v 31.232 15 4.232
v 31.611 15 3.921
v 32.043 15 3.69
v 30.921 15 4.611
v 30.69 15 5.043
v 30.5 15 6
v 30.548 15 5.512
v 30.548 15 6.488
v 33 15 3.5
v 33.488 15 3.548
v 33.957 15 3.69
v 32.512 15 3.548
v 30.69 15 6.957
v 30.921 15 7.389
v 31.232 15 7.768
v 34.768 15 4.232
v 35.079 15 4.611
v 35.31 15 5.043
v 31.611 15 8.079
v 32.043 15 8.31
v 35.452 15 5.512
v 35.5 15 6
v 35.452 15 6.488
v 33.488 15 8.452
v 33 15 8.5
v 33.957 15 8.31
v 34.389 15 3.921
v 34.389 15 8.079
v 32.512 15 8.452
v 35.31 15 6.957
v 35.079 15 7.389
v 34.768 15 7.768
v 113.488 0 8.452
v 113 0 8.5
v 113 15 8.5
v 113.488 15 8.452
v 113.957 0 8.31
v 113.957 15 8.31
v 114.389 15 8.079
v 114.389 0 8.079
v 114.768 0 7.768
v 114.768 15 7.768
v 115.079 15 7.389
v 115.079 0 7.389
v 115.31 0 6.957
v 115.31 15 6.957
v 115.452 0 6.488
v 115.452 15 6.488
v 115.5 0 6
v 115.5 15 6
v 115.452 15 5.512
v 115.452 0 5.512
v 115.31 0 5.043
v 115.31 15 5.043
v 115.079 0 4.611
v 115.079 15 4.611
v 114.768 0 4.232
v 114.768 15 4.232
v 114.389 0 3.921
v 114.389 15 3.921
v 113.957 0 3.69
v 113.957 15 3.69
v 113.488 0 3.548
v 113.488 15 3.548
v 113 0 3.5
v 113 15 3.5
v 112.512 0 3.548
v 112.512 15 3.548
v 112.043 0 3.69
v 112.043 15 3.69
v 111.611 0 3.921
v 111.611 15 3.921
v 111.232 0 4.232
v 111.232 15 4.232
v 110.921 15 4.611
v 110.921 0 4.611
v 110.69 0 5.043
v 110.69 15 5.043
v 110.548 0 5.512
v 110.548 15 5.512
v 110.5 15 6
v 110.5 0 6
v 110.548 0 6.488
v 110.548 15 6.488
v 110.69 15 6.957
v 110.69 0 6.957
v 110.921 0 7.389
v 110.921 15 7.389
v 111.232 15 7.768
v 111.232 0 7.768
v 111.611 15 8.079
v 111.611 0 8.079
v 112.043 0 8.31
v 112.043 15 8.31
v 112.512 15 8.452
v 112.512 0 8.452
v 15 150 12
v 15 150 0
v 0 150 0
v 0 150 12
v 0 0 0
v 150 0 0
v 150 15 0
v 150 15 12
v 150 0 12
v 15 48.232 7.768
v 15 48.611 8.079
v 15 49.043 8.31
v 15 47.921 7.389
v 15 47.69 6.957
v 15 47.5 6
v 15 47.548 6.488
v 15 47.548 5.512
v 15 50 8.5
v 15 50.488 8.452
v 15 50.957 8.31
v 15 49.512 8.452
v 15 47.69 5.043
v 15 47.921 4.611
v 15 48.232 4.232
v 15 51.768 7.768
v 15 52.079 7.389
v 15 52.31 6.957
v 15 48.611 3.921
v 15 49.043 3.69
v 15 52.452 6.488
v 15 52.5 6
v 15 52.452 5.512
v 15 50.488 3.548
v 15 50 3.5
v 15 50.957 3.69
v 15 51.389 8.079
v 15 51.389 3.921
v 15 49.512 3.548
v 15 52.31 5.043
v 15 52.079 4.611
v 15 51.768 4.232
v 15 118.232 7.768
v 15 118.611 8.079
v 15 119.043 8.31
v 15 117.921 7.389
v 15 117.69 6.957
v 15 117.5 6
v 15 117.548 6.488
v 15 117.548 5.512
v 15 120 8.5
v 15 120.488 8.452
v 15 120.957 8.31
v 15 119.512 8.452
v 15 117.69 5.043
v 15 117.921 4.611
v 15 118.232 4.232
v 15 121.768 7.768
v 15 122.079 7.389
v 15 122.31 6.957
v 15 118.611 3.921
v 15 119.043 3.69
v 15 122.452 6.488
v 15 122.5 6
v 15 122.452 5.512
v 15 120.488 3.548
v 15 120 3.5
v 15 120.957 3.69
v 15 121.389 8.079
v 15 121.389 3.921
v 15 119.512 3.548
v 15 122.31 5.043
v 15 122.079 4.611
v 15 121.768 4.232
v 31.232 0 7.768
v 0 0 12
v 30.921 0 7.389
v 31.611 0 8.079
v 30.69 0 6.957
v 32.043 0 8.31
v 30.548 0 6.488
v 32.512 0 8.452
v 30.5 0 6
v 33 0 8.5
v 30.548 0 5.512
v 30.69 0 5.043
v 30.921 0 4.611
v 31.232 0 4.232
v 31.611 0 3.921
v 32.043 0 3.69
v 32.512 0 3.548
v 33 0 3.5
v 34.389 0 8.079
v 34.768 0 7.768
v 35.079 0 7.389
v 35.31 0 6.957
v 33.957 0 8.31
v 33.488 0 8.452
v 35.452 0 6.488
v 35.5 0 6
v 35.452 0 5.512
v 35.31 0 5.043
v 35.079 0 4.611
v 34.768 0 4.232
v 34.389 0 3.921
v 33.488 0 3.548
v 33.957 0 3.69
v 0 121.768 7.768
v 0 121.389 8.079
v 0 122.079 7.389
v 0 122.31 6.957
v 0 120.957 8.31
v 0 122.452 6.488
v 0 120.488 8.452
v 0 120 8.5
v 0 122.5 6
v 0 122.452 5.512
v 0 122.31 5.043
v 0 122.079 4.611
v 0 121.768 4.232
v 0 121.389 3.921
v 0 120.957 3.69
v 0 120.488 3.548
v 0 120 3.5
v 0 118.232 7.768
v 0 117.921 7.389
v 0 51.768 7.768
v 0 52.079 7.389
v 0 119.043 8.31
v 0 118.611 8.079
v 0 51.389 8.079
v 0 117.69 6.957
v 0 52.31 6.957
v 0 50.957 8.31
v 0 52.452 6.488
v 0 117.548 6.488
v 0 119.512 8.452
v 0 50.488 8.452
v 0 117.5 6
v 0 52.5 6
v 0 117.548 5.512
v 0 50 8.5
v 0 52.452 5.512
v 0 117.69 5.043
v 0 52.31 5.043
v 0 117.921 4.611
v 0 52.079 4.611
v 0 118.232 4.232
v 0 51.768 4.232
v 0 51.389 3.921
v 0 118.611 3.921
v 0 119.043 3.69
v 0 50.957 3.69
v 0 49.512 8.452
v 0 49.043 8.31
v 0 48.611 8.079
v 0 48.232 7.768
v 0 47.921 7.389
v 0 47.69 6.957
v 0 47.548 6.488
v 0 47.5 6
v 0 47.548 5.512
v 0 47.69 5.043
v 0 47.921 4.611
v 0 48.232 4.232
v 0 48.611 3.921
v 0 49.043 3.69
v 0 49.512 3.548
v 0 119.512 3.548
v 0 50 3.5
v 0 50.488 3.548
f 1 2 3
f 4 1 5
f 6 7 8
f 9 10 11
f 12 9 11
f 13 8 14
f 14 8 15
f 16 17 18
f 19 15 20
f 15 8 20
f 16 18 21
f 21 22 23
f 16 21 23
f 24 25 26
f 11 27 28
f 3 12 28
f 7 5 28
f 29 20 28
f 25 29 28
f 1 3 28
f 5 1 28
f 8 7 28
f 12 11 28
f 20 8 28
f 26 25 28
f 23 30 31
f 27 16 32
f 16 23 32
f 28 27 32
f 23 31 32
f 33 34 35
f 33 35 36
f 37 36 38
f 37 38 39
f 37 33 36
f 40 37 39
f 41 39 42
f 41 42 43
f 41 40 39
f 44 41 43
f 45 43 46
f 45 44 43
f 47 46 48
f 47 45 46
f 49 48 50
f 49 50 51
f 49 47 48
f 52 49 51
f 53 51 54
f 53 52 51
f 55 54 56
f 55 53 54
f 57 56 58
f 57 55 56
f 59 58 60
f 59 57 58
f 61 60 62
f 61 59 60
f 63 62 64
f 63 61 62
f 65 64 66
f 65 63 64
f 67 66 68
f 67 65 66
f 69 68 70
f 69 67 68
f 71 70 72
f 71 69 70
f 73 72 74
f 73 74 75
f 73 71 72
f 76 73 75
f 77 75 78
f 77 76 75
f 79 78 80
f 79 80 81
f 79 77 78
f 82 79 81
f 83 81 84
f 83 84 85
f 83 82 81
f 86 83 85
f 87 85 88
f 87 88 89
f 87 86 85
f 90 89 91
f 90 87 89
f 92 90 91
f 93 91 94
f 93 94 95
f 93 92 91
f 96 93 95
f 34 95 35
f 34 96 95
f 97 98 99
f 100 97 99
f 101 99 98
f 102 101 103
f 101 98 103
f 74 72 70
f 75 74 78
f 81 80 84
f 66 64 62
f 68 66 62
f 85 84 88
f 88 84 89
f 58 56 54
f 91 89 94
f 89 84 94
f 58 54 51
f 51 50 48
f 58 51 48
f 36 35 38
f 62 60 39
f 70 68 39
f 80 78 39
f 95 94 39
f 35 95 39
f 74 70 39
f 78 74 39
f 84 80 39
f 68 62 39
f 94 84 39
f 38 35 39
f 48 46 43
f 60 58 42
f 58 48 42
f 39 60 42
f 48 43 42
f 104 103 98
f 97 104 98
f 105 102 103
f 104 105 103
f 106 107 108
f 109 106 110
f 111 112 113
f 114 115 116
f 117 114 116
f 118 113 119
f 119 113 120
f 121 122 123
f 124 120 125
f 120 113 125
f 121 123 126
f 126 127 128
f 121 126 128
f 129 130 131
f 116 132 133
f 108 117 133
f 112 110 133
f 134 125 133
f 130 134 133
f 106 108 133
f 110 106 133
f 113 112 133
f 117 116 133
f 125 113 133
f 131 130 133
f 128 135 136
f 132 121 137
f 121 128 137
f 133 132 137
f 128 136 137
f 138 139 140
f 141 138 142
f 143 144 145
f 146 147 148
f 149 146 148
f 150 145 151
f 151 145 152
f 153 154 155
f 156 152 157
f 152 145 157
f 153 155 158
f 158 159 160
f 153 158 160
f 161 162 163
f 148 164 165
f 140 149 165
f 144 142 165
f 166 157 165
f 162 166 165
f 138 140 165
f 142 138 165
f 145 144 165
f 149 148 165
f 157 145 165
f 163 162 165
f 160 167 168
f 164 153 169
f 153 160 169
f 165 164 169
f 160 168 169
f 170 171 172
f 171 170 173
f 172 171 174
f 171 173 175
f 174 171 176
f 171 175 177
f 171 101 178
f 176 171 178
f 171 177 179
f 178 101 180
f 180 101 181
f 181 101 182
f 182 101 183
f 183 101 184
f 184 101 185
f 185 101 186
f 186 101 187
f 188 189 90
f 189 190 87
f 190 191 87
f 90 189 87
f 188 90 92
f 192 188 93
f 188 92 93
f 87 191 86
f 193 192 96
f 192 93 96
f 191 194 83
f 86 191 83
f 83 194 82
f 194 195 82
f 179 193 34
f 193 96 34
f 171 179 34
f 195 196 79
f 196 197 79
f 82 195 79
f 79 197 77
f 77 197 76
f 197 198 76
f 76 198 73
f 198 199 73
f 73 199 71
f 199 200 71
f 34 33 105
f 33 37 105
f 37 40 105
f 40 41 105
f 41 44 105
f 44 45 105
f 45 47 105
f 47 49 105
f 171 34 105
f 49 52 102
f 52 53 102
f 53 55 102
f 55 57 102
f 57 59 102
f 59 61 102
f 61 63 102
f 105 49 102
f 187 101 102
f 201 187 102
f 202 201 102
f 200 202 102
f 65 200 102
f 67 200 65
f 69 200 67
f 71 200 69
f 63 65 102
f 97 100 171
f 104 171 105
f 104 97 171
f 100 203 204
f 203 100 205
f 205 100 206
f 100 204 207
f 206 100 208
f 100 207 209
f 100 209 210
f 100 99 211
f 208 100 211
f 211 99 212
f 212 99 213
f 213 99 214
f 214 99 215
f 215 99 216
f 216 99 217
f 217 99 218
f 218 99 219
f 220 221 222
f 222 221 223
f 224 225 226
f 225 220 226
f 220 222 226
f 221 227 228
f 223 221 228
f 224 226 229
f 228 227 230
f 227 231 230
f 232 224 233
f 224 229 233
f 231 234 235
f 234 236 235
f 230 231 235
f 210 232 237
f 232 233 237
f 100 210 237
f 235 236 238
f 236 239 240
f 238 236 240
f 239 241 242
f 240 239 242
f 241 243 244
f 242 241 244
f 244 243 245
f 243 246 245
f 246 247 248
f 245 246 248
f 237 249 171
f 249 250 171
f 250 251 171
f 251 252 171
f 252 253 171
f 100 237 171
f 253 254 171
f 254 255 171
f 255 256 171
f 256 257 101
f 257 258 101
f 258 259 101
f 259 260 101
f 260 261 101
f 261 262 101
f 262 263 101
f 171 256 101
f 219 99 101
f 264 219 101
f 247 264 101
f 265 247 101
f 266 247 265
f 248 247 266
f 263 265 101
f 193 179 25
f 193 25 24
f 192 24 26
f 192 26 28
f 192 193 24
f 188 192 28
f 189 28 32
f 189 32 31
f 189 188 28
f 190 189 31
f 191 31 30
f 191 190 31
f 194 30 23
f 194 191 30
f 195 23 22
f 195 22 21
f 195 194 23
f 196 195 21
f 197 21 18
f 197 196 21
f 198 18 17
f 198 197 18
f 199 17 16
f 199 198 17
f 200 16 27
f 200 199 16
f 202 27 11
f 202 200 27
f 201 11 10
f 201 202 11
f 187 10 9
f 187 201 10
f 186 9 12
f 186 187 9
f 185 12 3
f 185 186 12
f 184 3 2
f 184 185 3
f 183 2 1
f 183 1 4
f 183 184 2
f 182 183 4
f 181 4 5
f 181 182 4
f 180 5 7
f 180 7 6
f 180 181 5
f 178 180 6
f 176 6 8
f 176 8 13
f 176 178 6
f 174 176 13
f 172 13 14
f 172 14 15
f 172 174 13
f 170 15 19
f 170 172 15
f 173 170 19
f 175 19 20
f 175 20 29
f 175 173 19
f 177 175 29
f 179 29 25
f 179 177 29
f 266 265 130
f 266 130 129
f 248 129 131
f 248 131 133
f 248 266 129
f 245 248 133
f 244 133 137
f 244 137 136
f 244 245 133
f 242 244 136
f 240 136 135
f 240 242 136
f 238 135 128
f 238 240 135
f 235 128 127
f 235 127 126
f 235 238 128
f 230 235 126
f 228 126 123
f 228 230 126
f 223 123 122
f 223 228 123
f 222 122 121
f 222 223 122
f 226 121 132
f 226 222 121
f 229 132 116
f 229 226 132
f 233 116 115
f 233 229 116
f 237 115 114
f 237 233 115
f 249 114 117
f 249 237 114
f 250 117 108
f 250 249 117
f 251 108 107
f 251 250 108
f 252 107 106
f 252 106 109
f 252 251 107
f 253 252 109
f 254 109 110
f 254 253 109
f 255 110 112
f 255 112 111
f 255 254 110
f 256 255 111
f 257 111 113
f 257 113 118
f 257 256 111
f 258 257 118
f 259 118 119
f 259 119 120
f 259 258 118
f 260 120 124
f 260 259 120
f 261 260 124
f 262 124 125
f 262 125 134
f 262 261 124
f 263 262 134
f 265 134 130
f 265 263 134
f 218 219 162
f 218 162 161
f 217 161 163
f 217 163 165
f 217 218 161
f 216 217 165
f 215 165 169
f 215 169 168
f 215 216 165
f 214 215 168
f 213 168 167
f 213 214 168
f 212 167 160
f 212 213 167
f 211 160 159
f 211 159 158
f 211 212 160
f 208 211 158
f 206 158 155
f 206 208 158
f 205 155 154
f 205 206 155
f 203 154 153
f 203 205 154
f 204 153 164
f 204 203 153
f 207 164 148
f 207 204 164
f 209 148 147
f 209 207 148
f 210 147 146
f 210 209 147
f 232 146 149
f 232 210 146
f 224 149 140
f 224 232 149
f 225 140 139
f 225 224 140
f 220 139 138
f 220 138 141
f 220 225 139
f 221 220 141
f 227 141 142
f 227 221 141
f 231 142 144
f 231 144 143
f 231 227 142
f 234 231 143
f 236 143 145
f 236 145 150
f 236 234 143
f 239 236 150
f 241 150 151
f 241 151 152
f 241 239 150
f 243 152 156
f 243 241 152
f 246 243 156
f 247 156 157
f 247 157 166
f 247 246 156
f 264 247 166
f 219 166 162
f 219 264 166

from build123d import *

# Parameters (mm, degrees)
BOSS_EXTRUDE1_DEPTH = 12
SKETCH2_R           = 2.5
CUT_EXTRUDE2_DEPTH  = 15
SKETCH3_R           = 2.5
CUT_EXTRUDE4_DEPTH  = 15


with BuildPart() as part:
    # Sketch1 → Boss-Extrude1 (new body)
    with BuildSketch(Plane.XY):
        Polygon((0, 0), (150, 0), (150, 15), (15, 150), (0, 150), align=None)
    extrude(amount=BOSS_EXTRUDE1_DEPTH)

    # Sketch2 → Cut-Extrude2 (cut)
    with BuildSketch(Plane(origin=(0, 0, 0), x_dir=(1, 0, 0), z_dir=(0, 1, 0))):
        with Locations(Location((33, -6, 0), (0, 0, 270))):
            Circle(SKETCH2_R)
        with Locations(Location((113, -6, 0), (0, 0, 270))):
            Circle(SKETCH2_R)
    extrude(amount=CUT_EXTRUDE2_DEPTH, mode=Mode.SUBTRACT)

    # Sketch3 → Cut-Extrude4 (cut)
    with BuildSketch(Plane(origin=(0, 0, 0), x_dir=(0, 0, -1), z_dir=(1, 0, 0))):
        with Locations((-6, 50)):
            Circle(SKETCH3_R)
        with Locations((-6, 120)):
            Circle(SKETCH3_R)
    extrude(amount=CUT_EXTRUDE4_DEPTH, mode=Mode.SUBTRACT)


solid = part.part
